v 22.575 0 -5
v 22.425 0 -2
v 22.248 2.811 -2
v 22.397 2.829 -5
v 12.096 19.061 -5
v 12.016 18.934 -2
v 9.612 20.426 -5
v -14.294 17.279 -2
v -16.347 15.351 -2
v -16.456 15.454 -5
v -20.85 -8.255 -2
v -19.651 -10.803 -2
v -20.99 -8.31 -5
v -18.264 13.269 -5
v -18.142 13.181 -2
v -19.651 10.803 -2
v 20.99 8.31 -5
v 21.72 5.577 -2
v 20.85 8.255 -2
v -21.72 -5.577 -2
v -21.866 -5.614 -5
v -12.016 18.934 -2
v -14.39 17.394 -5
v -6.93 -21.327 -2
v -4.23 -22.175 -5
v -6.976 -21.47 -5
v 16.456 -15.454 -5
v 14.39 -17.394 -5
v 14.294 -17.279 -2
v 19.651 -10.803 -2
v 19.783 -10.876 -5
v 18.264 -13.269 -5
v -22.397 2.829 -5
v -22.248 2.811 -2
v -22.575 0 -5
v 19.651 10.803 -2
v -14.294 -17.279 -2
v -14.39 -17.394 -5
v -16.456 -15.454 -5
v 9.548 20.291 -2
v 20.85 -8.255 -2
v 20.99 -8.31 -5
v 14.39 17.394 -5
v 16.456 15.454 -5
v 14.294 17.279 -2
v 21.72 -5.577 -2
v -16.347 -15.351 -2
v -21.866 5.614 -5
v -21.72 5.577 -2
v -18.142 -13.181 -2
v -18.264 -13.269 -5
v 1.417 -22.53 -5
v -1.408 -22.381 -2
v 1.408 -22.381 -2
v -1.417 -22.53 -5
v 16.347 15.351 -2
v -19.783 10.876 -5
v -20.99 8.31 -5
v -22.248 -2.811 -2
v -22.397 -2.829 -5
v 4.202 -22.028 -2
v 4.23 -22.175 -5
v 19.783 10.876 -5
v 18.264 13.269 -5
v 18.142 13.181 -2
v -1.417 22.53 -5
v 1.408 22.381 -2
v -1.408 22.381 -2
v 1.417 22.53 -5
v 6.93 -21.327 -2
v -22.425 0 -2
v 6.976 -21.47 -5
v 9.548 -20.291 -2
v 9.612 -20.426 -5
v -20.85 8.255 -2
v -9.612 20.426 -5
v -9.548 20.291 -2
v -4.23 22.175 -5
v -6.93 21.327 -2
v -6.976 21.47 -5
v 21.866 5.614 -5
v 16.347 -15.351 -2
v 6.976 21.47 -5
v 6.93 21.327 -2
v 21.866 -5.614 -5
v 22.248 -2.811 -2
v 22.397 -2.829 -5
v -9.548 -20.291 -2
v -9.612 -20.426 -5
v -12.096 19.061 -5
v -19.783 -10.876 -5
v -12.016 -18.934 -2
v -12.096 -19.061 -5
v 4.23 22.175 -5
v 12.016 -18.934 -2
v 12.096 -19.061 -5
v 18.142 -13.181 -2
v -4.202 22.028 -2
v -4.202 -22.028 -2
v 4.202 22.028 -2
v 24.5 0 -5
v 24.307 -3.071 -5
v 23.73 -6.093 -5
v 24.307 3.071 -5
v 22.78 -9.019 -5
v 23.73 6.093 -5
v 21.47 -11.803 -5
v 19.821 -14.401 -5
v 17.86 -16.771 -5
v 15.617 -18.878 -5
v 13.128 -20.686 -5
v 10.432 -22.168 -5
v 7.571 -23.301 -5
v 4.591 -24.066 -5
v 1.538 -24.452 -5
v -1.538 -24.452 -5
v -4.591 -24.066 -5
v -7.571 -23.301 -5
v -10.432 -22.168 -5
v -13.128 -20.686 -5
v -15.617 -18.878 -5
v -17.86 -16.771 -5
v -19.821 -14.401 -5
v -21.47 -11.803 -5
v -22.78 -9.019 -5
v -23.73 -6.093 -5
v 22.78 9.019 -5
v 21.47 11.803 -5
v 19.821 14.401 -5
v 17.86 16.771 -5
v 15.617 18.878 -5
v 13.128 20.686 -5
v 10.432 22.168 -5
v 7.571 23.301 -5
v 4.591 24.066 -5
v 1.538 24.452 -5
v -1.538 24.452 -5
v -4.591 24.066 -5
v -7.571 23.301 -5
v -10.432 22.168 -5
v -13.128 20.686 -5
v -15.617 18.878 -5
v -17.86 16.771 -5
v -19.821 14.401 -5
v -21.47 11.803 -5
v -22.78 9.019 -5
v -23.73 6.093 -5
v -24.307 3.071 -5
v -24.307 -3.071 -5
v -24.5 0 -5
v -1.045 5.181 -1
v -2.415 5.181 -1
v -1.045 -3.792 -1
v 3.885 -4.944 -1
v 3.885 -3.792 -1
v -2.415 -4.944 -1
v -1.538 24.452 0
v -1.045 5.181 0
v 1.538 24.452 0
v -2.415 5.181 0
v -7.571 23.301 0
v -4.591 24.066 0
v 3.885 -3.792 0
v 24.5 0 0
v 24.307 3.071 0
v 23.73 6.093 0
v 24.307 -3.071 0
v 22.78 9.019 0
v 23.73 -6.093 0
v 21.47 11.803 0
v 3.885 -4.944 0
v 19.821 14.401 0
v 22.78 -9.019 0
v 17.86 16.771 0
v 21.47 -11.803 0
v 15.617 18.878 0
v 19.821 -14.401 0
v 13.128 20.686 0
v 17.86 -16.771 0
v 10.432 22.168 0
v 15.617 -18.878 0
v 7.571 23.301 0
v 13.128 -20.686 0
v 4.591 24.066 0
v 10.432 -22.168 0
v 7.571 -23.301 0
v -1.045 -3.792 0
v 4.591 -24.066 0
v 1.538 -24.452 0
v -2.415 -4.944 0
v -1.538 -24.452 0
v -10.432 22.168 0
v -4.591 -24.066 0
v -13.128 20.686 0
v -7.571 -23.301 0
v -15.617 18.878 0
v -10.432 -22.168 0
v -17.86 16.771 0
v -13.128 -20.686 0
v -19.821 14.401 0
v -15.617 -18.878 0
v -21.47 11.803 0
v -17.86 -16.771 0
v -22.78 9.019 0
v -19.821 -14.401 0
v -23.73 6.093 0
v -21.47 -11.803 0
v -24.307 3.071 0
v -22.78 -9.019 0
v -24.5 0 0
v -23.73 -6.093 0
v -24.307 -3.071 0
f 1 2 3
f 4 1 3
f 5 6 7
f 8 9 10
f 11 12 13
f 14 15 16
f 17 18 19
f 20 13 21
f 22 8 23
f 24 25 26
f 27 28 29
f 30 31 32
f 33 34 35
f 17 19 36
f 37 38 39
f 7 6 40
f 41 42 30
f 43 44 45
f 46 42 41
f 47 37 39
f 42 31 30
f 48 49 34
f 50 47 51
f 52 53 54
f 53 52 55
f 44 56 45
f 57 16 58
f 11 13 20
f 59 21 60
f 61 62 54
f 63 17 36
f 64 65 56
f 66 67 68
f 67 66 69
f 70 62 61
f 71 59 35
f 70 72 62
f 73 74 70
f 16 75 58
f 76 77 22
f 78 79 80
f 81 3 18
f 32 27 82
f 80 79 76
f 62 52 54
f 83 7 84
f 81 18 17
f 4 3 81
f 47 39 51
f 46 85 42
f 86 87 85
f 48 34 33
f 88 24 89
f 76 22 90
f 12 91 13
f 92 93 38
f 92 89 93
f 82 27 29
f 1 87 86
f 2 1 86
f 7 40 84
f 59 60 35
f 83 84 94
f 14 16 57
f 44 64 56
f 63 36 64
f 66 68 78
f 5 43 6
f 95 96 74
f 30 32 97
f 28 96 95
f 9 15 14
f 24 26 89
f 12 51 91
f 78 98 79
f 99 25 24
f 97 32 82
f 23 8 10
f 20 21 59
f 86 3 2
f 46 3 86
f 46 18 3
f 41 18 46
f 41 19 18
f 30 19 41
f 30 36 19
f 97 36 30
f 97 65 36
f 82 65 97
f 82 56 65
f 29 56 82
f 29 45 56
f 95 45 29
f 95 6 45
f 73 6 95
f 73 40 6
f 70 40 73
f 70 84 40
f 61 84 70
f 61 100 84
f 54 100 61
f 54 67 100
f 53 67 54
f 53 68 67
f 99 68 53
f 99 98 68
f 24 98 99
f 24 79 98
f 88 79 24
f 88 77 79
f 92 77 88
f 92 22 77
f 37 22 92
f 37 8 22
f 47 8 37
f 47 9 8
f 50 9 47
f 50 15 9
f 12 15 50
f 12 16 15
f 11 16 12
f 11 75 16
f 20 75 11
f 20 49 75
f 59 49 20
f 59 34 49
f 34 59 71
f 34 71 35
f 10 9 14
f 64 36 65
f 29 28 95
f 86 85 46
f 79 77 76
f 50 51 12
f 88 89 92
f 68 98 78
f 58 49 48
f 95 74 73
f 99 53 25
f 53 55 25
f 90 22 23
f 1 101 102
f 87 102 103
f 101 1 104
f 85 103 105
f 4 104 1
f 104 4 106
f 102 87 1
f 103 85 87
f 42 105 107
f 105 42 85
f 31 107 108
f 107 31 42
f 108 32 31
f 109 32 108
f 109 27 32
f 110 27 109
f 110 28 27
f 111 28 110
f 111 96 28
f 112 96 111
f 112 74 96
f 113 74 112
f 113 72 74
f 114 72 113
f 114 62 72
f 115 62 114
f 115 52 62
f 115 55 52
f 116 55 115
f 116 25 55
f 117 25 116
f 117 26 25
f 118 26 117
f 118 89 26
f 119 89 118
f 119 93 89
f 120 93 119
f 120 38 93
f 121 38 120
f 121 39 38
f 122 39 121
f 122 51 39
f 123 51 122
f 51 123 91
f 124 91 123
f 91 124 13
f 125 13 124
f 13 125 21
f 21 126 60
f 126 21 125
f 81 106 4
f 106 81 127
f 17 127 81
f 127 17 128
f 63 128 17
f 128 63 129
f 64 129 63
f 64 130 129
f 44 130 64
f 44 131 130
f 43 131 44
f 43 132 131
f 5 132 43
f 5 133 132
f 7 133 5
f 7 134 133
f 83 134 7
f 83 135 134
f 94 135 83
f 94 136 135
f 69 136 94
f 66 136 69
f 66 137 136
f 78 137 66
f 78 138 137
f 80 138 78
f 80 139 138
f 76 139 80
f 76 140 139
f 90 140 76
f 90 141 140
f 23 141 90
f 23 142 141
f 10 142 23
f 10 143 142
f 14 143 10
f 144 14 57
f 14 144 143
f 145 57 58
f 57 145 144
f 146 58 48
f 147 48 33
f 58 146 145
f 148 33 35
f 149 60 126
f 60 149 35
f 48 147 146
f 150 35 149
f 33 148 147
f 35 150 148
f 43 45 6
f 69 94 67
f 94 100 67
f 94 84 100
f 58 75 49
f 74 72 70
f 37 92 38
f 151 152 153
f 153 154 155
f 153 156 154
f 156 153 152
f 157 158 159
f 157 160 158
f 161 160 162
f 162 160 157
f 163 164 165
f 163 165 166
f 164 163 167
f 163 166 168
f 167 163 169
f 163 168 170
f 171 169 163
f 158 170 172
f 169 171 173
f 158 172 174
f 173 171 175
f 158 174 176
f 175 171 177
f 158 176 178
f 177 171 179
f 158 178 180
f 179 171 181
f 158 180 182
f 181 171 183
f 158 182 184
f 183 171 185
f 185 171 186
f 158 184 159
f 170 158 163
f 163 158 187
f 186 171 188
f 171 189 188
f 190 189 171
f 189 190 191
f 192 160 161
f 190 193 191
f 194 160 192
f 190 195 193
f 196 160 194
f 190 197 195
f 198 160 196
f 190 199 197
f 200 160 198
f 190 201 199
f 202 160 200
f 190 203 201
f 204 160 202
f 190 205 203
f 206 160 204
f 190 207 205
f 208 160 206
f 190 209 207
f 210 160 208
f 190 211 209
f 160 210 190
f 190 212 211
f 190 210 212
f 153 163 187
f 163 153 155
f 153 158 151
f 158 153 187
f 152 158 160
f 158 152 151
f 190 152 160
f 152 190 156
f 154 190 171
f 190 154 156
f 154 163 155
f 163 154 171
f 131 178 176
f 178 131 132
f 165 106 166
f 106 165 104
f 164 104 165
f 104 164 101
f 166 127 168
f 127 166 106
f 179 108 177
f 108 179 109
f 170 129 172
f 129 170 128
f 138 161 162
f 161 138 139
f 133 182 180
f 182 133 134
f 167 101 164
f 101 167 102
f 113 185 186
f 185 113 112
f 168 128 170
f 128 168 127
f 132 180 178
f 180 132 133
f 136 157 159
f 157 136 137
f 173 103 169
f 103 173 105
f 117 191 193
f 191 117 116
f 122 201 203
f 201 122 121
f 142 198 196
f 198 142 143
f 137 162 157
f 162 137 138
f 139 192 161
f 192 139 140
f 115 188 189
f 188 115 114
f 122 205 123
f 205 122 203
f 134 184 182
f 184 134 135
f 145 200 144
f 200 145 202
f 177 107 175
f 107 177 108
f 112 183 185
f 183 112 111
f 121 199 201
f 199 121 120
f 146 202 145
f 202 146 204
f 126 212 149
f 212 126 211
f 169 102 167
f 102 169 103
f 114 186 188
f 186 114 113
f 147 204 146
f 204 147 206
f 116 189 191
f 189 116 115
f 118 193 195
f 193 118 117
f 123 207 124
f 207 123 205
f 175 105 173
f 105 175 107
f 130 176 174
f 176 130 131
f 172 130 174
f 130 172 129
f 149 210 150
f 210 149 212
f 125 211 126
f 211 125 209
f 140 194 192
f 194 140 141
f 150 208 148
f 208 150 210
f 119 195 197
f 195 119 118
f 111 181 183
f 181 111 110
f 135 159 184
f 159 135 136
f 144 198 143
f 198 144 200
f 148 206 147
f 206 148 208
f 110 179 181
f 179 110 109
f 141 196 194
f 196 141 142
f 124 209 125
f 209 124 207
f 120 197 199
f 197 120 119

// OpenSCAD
$fn = 50;


difference() {
	union() {
		translate(v = [0, 0, -5.0000000000]) {
			cylinder(h = 5, r = 24.5000000000);
		}
	}
	union() {
		#translate(v = [0, 0, -5.0000000000]) {
			cylinder(h = 3, r1 = 22.5750000000, r2 = 22.4250000000);
		}
		translate(v = [0, 0, -1]) {
			linear_extrude(height = 1) {
				text(font = "Impact", halign = "center", size = 10, text = "L", valign = "center");
			}
		}
	}
}
